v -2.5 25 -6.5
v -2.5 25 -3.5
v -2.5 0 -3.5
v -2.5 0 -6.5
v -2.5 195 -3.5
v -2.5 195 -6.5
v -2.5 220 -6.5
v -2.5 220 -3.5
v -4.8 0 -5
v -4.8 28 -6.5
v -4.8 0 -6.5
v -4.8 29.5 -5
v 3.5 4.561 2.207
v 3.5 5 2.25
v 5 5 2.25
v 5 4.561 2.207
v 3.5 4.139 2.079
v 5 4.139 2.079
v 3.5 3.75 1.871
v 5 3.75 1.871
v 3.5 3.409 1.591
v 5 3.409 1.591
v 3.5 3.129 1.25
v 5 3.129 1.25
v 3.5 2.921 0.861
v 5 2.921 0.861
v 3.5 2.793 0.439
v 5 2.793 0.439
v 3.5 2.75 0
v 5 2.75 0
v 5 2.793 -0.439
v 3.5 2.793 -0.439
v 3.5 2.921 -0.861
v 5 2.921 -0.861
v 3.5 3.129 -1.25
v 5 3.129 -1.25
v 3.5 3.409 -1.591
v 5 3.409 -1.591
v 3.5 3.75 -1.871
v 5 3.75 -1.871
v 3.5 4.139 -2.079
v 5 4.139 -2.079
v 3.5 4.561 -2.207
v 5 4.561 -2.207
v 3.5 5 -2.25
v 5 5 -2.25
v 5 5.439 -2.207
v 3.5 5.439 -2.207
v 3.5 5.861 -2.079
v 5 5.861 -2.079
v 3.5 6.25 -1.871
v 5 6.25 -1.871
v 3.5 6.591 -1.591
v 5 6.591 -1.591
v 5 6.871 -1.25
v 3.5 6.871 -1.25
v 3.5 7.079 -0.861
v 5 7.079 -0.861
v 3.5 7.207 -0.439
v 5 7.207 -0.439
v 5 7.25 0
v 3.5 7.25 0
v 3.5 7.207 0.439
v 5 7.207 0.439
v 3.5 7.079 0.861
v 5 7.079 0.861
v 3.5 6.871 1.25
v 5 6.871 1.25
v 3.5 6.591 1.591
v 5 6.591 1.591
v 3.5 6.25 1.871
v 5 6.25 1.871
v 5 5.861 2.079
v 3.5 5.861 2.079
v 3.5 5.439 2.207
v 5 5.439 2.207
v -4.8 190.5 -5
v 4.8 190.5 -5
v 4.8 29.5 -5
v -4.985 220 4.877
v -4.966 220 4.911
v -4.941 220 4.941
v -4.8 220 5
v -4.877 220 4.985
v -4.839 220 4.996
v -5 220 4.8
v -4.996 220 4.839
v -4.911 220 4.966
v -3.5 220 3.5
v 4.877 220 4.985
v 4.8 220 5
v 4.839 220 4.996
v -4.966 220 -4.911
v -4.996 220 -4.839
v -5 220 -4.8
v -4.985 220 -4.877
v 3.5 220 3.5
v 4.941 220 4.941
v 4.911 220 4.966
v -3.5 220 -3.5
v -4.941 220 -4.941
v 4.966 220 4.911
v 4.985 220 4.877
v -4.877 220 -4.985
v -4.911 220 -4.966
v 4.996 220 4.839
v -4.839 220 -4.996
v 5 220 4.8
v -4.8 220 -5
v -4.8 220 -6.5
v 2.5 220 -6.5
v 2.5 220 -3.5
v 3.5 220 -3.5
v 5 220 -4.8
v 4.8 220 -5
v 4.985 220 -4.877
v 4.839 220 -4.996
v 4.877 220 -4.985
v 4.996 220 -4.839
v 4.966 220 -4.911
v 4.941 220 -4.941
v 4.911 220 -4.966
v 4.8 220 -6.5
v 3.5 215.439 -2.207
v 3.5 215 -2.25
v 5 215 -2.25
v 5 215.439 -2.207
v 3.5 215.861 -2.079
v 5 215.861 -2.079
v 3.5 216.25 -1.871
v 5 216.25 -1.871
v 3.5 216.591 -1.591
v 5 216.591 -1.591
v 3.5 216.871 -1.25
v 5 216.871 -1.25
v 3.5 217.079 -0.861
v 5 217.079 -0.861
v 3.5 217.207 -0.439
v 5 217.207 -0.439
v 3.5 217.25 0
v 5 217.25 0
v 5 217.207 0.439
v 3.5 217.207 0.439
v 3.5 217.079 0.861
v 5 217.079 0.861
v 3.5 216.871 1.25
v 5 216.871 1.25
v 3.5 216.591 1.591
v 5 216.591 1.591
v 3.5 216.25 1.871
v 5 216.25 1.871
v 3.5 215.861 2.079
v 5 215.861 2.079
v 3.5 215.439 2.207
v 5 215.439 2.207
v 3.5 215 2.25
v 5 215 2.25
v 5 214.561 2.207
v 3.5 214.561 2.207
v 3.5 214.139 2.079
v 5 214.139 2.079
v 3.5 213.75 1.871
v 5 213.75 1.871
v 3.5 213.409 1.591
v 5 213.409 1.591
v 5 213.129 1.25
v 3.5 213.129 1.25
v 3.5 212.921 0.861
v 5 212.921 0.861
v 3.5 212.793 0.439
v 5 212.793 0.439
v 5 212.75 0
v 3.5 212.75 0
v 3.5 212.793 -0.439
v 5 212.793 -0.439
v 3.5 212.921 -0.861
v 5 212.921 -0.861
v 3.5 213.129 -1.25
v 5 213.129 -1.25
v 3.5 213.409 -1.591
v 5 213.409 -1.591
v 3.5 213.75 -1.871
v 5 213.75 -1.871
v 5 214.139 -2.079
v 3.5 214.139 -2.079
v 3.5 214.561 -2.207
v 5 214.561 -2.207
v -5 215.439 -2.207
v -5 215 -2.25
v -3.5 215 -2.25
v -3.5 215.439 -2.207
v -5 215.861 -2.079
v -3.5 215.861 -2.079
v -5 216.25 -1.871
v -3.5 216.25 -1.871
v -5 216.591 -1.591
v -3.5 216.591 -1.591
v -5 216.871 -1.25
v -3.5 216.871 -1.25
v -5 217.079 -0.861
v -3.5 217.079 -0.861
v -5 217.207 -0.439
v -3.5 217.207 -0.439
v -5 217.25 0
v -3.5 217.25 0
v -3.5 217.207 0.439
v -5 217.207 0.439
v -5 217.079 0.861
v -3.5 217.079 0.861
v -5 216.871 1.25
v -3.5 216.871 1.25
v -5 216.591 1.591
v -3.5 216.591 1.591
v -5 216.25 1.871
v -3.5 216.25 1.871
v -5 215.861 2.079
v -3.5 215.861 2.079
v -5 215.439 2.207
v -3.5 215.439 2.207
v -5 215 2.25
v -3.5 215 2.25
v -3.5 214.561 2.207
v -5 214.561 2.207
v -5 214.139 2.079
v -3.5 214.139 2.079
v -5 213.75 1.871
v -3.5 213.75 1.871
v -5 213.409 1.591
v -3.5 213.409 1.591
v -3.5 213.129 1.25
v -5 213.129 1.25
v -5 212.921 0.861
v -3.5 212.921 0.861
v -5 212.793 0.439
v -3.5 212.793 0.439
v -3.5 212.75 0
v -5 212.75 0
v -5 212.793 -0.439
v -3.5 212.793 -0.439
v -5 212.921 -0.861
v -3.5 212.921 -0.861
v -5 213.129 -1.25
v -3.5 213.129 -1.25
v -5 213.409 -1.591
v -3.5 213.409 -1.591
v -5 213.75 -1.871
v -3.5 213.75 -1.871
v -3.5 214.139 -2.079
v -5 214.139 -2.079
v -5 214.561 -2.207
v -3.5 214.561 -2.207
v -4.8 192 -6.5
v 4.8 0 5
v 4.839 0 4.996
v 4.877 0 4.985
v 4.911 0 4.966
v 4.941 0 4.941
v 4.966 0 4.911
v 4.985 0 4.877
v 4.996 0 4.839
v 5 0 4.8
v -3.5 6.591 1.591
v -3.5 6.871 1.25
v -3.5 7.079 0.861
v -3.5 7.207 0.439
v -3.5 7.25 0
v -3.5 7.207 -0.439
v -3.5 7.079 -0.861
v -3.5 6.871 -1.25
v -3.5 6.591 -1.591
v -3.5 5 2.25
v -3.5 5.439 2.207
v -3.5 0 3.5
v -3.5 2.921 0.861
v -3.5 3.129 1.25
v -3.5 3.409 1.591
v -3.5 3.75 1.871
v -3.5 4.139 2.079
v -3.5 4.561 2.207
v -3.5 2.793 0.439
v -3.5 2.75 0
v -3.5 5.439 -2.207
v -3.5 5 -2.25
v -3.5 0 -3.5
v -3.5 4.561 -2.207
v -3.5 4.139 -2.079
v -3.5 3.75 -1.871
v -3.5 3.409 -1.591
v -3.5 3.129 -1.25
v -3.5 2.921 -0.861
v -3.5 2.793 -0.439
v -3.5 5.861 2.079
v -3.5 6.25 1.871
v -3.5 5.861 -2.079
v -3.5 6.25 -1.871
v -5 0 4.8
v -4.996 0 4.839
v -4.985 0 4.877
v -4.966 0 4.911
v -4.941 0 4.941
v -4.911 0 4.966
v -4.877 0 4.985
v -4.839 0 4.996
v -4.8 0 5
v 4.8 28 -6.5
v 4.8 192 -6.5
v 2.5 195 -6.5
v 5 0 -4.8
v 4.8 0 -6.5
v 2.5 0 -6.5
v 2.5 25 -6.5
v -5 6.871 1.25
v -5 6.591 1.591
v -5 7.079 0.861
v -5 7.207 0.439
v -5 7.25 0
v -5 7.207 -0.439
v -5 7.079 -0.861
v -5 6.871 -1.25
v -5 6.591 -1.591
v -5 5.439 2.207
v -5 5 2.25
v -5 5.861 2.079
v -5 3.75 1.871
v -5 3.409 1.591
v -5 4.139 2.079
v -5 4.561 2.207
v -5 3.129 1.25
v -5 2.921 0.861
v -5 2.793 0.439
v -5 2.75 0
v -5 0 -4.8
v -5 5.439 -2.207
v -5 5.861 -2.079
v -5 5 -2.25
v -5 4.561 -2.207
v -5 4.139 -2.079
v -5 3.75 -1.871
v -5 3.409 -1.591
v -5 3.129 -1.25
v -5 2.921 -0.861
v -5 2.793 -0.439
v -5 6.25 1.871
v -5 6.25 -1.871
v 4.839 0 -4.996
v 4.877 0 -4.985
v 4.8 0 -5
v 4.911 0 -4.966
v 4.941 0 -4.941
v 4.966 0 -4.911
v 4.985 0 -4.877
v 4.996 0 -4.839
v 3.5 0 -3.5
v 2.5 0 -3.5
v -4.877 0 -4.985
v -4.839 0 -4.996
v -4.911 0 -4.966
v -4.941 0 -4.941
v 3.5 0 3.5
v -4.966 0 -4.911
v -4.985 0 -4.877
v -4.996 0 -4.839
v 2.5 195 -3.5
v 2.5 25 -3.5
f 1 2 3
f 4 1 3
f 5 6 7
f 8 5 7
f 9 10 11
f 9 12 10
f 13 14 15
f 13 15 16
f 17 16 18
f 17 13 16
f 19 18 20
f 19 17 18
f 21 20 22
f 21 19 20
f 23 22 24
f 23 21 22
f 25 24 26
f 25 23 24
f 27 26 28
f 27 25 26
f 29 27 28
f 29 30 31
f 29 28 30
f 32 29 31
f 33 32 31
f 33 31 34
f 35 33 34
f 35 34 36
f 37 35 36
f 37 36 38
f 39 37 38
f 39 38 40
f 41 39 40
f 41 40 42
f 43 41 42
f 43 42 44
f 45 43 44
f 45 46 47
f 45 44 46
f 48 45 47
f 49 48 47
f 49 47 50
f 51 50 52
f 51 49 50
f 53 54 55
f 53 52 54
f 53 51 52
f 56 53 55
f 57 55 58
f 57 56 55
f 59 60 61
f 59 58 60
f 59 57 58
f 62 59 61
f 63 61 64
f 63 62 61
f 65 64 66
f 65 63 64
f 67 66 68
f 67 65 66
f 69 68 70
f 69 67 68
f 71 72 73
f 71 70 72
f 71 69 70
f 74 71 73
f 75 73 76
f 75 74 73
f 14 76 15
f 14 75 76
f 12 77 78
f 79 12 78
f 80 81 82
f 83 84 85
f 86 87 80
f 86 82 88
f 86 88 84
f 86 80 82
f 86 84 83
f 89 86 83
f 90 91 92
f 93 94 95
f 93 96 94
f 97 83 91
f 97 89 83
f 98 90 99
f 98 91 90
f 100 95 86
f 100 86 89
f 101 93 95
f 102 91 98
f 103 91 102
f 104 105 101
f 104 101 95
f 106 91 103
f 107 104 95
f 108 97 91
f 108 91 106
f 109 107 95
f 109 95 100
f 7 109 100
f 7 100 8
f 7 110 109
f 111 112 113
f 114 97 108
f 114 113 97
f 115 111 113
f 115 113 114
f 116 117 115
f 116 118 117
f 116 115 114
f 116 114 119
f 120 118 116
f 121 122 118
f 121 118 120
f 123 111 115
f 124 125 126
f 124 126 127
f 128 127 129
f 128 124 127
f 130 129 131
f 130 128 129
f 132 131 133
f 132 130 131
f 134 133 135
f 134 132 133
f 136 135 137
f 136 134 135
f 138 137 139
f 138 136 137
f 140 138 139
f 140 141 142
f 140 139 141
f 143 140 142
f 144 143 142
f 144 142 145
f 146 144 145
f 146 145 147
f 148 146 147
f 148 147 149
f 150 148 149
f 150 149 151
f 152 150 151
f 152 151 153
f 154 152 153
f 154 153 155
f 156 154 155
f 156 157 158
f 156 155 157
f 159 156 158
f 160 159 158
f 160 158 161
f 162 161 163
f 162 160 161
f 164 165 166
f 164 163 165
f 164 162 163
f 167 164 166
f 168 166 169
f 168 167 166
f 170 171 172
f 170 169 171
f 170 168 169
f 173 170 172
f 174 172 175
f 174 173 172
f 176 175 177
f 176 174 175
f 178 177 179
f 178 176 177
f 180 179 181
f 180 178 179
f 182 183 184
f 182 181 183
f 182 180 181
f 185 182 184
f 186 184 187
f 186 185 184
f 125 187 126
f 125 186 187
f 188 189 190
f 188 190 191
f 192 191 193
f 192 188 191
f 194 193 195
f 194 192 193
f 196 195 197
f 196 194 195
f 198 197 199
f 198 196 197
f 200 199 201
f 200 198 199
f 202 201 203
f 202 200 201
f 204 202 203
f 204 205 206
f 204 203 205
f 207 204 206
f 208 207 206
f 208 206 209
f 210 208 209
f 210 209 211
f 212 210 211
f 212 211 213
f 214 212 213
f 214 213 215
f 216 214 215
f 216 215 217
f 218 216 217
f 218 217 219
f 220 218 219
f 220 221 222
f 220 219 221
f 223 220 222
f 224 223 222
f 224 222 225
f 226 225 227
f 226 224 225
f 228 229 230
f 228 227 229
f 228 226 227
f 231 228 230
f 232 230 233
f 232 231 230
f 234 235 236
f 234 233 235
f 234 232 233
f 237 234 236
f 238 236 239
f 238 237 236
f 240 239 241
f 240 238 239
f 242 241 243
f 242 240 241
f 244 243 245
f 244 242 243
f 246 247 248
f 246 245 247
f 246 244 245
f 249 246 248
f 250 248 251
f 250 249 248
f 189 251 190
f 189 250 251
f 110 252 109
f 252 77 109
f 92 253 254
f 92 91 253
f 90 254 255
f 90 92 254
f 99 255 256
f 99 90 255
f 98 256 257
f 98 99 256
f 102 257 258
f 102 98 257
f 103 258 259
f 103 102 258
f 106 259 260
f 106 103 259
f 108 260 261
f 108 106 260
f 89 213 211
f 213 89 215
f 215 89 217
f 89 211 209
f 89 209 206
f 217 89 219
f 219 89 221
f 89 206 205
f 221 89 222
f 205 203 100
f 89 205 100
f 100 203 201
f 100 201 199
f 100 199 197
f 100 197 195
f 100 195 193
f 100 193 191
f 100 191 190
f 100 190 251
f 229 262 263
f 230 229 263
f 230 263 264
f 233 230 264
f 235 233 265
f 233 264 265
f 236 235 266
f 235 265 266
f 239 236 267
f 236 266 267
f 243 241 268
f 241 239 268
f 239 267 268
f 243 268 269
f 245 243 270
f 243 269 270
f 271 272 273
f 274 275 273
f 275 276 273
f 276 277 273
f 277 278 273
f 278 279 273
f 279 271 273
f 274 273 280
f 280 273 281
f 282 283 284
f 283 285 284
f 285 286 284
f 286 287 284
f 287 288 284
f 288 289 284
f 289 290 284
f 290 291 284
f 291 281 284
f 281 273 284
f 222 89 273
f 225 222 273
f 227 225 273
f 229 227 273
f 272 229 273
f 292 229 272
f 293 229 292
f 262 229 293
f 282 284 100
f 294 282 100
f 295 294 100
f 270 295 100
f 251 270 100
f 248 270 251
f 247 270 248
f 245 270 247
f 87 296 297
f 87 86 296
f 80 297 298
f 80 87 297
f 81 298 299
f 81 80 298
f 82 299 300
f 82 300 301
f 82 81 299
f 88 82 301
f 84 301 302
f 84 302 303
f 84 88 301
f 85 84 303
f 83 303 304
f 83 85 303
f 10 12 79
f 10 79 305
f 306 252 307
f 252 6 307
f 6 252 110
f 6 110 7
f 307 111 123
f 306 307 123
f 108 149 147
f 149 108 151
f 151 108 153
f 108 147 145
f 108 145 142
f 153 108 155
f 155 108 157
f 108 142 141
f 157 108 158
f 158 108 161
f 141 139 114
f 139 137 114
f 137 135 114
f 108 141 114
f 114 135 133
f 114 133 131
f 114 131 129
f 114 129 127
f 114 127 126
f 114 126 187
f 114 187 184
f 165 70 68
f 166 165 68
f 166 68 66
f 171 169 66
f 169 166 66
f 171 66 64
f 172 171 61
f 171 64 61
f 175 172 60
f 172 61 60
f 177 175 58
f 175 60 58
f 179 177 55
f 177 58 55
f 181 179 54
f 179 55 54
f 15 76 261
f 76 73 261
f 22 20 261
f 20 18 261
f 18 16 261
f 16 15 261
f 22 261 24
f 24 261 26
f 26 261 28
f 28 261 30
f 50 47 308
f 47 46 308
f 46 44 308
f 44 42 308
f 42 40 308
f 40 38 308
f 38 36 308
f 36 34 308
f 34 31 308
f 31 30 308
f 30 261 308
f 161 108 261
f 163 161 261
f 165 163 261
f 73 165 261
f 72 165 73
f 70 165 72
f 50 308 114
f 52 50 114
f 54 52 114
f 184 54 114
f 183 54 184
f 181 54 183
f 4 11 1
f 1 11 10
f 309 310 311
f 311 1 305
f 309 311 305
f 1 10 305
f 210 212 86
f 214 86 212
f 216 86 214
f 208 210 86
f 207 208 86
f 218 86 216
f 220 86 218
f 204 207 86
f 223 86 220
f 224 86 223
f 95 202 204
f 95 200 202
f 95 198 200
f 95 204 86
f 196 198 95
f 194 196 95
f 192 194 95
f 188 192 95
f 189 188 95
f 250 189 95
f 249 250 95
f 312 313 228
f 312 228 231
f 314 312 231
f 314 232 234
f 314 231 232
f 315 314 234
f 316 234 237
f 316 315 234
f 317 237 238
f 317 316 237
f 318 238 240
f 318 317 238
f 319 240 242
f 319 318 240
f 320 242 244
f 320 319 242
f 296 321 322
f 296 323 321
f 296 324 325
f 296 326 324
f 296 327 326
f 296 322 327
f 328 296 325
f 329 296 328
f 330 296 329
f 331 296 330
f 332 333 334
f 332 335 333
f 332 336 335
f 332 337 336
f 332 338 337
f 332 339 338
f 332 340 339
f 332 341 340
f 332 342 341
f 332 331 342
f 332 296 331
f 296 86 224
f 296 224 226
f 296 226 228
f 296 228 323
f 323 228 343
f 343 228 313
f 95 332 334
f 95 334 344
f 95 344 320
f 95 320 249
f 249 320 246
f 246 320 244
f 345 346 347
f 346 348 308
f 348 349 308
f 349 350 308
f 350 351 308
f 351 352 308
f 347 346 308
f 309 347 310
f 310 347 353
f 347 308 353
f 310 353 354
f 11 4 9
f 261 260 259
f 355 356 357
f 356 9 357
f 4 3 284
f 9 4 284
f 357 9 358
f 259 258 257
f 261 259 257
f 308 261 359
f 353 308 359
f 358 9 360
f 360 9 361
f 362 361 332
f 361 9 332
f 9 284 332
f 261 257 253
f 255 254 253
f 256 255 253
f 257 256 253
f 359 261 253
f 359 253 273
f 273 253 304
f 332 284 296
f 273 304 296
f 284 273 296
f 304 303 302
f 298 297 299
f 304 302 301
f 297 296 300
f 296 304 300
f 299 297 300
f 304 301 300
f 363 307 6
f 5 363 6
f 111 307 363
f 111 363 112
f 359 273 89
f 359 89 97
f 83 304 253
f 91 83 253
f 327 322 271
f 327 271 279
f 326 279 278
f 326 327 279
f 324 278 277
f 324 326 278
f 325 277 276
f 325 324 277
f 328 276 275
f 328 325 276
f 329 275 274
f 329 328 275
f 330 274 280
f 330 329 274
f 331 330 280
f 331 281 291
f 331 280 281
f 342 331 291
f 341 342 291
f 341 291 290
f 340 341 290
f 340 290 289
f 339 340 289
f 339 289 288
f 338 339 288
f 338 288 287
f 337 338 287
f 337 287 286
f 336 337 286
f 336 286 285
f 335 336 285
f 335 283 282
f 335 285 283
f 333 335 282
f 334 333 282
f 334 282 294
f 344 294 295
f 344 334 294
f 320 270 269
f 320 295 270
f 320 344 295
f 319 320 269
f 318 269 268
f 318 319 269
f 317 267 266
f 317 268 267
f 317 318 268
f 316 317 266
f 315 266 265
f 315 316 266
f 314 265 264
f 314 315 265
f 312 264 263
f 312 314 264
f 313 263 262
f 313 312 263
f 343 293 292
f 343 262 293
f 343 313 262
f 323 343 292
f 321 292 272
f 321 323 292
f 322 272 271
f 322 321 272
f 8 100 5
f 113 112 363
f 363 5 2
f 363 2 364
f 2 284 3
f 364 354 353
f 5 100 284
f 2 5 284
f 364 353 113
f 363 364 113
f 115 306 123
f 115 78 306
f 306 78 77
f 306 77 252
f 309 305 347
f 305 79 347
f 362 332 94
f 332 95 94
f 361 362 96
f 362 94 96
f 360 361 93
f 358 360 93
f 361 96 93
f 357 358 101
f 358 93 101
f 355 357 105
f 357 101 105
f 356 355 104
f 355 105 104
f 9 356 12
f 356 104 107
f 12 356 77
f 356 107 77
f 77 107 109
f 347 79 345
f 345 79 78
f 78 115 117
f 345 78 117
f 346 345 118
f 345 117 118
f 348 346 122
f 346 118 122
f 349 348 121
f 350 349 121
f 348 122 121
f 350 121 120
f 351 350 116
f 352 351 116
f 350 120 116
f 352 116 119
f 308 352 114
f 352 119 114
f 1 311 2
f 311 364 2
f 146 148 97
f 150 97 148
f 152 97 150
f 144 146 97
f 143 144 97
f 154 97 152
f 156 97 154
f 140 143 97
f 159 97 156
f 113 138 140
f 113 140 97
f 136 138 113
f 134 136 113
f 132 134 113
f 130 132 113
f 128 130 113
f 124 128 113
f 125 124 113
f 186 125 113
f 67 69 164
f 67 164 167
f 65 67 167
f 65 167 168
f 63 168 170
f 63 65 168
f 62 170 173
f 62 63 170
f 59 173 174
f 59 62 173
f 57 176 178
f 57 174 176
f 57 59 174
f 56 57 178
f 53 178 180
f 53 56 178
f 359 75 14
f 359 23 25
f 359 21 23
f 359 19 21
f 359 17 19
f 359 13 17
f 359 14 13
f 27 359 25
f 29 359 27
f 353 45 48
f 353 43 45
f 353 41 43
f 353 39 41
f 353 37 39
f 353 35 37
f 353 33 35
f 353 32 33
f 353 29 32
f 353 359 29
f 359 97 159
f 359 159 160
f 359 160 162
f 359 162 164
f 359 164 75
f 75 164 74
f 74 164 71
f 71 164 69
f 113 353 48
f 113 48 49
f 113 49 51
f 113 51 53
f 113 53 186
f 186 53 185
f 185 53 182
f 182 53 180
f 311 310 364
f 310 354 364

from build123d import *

# Parameters (mm, degrees)
SKETCH1_W               = 10
SKETCH1_H               = 10
SKETCH1_W_2             = 7
SKETCH1_H_2             = 7
EXTRUDE_THIN1_DEPTH     = 220
CUT_EXTRUDE1_DEPTH      = 221.113607031
CUT_EXTRUDE1_DEPTH_BACK = 221.113607031
SKETCH2_R               = 2.25
FILLET1_R               = 0.2
CUT_EXTRUDE2_REACH      = 222.284
SKETCH5_W               = 5
SKETCH5_H               = 25
BOSS_EXTRUDE3_DEPTH     = 1.5
CHAMFER1_SIZE           = 2


with BuildPart() as part:
    # Sketch1 → Extrude-Thin1 (new body)
    with BuildSketch(Plane(origin=(0, 0, 0), x_dir=(1, 0, 0), z_dir=(0, 1, 0))):
        Rectangle(SKETCH1_W, SKETCH1_H)
        Rectangle(SKETCH1_W_2, SKETCH1_H_2, mode=Mode.SUBTRACT)
    extrude(amount=EXTRUDE_THIN1_DEPTH)

    # Sketch2 → Cut-Extrude1 (cut, two sides: drawn at the far end of the back side and taken through both)
    with BuildSketch(Plane(origin=(0, 0, 0), x_dir=(0, 0, -1), z_dir=(1, 0, 0)).offset(-CUT_EXTRUDE1_DEPTH_BACK)):
        with Locations((0, 215)):
            Circle(SKETCH2_R)
        with Locations(Location((0, 5, 0), (0, 0, 180))):
            Circle(SKETCH2_R)
    extrude(amount=CUT_EXTRUDE1_DEPTH + CUT_EXTRUDE1_DEPTH_BACK, mode=Mode.SUBTRACT)

    # Fillet1
    fillet1_edges = [part.edges().sort_by_distance(p)[0] for p in [
        (-5, 110, -5),
        (5, 110, -5),
        (5, 110, 5),
        (-5, 110, 5),
    ]]
    fillet(fillet1_edges, radius=FILLET1_R)

    # Sketch5 → Cut-Extrude2 (cut, up to next)
    with BuildSketch(Plane(origin=(0, 0, -5), x_dir=(-1, 0, 0), z_dir=(0, 0, -1)), mode=Mode.PRIVATE) as cut_extrude2_sk1:
        with Locations((0, 207.5)):
            Rectangle(SKETCH5_W, SKETCH5_H)
    cut_extrude2_tool1 = extrude(cut_extrude2_sk1.sketch, amount=-CUT_EXTRUDE2_REACH, mode=Mode.PRIVATE) & part.part
    # Sketch5 → Cut-Extrude2 (cut, up to next)
    with BuildSketch(Plane(origin=(0, 0, -5), x_dir=(-1, 0, 0), z_dir=(0, 0, -1)), mode=Mode.PRIVATE) as cut_extrude2_sk2:
        with Locations((0, 12.5)):
            Rectangle(SKETCH5_W, SKETCH5_H)
    cut_extrude2_tool2 = extrude(cut_extrude2_sk2.sketch, amount=-CUT_EXTRUDE2_REACH, mode=Mode.PRIVATE) & part.part
    add(cut_extrude2_tool1.solids().sort_by_distance((0, 207.5, -5))[0], mode=Mode.SUBTRACT)
    add(cut_extrude2_tool2.solids().sort_by_distance((0, 12.5, -5))[0], mode=Mode.SUBTRACT)

    # Sketch5<3> → Boss-Extrude3 (add)
    with BuildSketch(Plane(origin=(0, 0, -5), x_dir=(-1, 0, 0), z_dir=(0, 0, -1))):
        Polygon((4.8, 0), (4.8, 27.5), (-4.8, 27.5), (-4.8, 0), (-2.5, 0), (-2.5, 25), (2.5, 25), (2.5, 0), align=None)
        Polygon((-4.8, 192.5), (4.8, 192.5), (4.8, 220), (2.5, 220), (2.5, 195), (-2.5, 195), (-2.5, 220), (-4.8, 220), align=None)
    extrude(amount=BOSS_EXTRUDE3_DEPTH)

    # Chamfer1
    # the kernel refuses this chamfer: 2 mm, written as the material it adds along each edge
    with BuildSketch(Plane(origin=(-4.8, 27.5, -5), x_dir=(0, 0.9996219169112968, 0.02749587661058694), z_dir=(1, 0, 0))) as chamfer1_piece_1_section:
        Polygon((CHAMFER1_SIZE * 0.999621916911, -CHAMFER1_SIZE * 0.0274958766106), (-CHAMFER1_SIZE * 0.0274958766106, -CHAMFER1_SIZE * 0.999621916911), (0, 0), align=None)
    chamfer1_piece_1 = extrude(amount=9.6, mode=Mode.PRIVATE)
    chamfer1_piece_1 = split(chamfer1_piece_1, bisect_by=Plane(origin=(0, 28.20391822, -6.5), z_dir=(0, 0, 1)), keep=Keep.TOP, mode=Mode.PRIVATE)
    add(chamfer1_piece_1)
    with BuildSketch(Plane(origin=(4.8, 192.5, -5), x_dir=(0, -0.9996219169112968, 0.027495876610586605), z_dir=(-1, 0, 0))) as chamfer1_piece_2_section:
        Polygon((CHAMFER1_SIZE * 0.999621916911, -CHAMFER1_SIZE * 0.0274958766106), (-CHAMFER1_SIZE * 0.0274958766106, -CHAMFER1_SIZE * 0.999621916911), (0, 0), align=None)
    chamfer1_piece_2 = extrude(amount=9.6, mode=Mode.PRIVATE)
    chamfer1_piece_2 = split(chamfer1_piece_2, bisect_by=Plane(origin=(0, 191.79608178, -6.5), z_dir=(0, 0, 1)), keep=Keep.TOP, mode=Mode.PRIVATE)
    add(chamfer1_piece_2)


solid = part.part
